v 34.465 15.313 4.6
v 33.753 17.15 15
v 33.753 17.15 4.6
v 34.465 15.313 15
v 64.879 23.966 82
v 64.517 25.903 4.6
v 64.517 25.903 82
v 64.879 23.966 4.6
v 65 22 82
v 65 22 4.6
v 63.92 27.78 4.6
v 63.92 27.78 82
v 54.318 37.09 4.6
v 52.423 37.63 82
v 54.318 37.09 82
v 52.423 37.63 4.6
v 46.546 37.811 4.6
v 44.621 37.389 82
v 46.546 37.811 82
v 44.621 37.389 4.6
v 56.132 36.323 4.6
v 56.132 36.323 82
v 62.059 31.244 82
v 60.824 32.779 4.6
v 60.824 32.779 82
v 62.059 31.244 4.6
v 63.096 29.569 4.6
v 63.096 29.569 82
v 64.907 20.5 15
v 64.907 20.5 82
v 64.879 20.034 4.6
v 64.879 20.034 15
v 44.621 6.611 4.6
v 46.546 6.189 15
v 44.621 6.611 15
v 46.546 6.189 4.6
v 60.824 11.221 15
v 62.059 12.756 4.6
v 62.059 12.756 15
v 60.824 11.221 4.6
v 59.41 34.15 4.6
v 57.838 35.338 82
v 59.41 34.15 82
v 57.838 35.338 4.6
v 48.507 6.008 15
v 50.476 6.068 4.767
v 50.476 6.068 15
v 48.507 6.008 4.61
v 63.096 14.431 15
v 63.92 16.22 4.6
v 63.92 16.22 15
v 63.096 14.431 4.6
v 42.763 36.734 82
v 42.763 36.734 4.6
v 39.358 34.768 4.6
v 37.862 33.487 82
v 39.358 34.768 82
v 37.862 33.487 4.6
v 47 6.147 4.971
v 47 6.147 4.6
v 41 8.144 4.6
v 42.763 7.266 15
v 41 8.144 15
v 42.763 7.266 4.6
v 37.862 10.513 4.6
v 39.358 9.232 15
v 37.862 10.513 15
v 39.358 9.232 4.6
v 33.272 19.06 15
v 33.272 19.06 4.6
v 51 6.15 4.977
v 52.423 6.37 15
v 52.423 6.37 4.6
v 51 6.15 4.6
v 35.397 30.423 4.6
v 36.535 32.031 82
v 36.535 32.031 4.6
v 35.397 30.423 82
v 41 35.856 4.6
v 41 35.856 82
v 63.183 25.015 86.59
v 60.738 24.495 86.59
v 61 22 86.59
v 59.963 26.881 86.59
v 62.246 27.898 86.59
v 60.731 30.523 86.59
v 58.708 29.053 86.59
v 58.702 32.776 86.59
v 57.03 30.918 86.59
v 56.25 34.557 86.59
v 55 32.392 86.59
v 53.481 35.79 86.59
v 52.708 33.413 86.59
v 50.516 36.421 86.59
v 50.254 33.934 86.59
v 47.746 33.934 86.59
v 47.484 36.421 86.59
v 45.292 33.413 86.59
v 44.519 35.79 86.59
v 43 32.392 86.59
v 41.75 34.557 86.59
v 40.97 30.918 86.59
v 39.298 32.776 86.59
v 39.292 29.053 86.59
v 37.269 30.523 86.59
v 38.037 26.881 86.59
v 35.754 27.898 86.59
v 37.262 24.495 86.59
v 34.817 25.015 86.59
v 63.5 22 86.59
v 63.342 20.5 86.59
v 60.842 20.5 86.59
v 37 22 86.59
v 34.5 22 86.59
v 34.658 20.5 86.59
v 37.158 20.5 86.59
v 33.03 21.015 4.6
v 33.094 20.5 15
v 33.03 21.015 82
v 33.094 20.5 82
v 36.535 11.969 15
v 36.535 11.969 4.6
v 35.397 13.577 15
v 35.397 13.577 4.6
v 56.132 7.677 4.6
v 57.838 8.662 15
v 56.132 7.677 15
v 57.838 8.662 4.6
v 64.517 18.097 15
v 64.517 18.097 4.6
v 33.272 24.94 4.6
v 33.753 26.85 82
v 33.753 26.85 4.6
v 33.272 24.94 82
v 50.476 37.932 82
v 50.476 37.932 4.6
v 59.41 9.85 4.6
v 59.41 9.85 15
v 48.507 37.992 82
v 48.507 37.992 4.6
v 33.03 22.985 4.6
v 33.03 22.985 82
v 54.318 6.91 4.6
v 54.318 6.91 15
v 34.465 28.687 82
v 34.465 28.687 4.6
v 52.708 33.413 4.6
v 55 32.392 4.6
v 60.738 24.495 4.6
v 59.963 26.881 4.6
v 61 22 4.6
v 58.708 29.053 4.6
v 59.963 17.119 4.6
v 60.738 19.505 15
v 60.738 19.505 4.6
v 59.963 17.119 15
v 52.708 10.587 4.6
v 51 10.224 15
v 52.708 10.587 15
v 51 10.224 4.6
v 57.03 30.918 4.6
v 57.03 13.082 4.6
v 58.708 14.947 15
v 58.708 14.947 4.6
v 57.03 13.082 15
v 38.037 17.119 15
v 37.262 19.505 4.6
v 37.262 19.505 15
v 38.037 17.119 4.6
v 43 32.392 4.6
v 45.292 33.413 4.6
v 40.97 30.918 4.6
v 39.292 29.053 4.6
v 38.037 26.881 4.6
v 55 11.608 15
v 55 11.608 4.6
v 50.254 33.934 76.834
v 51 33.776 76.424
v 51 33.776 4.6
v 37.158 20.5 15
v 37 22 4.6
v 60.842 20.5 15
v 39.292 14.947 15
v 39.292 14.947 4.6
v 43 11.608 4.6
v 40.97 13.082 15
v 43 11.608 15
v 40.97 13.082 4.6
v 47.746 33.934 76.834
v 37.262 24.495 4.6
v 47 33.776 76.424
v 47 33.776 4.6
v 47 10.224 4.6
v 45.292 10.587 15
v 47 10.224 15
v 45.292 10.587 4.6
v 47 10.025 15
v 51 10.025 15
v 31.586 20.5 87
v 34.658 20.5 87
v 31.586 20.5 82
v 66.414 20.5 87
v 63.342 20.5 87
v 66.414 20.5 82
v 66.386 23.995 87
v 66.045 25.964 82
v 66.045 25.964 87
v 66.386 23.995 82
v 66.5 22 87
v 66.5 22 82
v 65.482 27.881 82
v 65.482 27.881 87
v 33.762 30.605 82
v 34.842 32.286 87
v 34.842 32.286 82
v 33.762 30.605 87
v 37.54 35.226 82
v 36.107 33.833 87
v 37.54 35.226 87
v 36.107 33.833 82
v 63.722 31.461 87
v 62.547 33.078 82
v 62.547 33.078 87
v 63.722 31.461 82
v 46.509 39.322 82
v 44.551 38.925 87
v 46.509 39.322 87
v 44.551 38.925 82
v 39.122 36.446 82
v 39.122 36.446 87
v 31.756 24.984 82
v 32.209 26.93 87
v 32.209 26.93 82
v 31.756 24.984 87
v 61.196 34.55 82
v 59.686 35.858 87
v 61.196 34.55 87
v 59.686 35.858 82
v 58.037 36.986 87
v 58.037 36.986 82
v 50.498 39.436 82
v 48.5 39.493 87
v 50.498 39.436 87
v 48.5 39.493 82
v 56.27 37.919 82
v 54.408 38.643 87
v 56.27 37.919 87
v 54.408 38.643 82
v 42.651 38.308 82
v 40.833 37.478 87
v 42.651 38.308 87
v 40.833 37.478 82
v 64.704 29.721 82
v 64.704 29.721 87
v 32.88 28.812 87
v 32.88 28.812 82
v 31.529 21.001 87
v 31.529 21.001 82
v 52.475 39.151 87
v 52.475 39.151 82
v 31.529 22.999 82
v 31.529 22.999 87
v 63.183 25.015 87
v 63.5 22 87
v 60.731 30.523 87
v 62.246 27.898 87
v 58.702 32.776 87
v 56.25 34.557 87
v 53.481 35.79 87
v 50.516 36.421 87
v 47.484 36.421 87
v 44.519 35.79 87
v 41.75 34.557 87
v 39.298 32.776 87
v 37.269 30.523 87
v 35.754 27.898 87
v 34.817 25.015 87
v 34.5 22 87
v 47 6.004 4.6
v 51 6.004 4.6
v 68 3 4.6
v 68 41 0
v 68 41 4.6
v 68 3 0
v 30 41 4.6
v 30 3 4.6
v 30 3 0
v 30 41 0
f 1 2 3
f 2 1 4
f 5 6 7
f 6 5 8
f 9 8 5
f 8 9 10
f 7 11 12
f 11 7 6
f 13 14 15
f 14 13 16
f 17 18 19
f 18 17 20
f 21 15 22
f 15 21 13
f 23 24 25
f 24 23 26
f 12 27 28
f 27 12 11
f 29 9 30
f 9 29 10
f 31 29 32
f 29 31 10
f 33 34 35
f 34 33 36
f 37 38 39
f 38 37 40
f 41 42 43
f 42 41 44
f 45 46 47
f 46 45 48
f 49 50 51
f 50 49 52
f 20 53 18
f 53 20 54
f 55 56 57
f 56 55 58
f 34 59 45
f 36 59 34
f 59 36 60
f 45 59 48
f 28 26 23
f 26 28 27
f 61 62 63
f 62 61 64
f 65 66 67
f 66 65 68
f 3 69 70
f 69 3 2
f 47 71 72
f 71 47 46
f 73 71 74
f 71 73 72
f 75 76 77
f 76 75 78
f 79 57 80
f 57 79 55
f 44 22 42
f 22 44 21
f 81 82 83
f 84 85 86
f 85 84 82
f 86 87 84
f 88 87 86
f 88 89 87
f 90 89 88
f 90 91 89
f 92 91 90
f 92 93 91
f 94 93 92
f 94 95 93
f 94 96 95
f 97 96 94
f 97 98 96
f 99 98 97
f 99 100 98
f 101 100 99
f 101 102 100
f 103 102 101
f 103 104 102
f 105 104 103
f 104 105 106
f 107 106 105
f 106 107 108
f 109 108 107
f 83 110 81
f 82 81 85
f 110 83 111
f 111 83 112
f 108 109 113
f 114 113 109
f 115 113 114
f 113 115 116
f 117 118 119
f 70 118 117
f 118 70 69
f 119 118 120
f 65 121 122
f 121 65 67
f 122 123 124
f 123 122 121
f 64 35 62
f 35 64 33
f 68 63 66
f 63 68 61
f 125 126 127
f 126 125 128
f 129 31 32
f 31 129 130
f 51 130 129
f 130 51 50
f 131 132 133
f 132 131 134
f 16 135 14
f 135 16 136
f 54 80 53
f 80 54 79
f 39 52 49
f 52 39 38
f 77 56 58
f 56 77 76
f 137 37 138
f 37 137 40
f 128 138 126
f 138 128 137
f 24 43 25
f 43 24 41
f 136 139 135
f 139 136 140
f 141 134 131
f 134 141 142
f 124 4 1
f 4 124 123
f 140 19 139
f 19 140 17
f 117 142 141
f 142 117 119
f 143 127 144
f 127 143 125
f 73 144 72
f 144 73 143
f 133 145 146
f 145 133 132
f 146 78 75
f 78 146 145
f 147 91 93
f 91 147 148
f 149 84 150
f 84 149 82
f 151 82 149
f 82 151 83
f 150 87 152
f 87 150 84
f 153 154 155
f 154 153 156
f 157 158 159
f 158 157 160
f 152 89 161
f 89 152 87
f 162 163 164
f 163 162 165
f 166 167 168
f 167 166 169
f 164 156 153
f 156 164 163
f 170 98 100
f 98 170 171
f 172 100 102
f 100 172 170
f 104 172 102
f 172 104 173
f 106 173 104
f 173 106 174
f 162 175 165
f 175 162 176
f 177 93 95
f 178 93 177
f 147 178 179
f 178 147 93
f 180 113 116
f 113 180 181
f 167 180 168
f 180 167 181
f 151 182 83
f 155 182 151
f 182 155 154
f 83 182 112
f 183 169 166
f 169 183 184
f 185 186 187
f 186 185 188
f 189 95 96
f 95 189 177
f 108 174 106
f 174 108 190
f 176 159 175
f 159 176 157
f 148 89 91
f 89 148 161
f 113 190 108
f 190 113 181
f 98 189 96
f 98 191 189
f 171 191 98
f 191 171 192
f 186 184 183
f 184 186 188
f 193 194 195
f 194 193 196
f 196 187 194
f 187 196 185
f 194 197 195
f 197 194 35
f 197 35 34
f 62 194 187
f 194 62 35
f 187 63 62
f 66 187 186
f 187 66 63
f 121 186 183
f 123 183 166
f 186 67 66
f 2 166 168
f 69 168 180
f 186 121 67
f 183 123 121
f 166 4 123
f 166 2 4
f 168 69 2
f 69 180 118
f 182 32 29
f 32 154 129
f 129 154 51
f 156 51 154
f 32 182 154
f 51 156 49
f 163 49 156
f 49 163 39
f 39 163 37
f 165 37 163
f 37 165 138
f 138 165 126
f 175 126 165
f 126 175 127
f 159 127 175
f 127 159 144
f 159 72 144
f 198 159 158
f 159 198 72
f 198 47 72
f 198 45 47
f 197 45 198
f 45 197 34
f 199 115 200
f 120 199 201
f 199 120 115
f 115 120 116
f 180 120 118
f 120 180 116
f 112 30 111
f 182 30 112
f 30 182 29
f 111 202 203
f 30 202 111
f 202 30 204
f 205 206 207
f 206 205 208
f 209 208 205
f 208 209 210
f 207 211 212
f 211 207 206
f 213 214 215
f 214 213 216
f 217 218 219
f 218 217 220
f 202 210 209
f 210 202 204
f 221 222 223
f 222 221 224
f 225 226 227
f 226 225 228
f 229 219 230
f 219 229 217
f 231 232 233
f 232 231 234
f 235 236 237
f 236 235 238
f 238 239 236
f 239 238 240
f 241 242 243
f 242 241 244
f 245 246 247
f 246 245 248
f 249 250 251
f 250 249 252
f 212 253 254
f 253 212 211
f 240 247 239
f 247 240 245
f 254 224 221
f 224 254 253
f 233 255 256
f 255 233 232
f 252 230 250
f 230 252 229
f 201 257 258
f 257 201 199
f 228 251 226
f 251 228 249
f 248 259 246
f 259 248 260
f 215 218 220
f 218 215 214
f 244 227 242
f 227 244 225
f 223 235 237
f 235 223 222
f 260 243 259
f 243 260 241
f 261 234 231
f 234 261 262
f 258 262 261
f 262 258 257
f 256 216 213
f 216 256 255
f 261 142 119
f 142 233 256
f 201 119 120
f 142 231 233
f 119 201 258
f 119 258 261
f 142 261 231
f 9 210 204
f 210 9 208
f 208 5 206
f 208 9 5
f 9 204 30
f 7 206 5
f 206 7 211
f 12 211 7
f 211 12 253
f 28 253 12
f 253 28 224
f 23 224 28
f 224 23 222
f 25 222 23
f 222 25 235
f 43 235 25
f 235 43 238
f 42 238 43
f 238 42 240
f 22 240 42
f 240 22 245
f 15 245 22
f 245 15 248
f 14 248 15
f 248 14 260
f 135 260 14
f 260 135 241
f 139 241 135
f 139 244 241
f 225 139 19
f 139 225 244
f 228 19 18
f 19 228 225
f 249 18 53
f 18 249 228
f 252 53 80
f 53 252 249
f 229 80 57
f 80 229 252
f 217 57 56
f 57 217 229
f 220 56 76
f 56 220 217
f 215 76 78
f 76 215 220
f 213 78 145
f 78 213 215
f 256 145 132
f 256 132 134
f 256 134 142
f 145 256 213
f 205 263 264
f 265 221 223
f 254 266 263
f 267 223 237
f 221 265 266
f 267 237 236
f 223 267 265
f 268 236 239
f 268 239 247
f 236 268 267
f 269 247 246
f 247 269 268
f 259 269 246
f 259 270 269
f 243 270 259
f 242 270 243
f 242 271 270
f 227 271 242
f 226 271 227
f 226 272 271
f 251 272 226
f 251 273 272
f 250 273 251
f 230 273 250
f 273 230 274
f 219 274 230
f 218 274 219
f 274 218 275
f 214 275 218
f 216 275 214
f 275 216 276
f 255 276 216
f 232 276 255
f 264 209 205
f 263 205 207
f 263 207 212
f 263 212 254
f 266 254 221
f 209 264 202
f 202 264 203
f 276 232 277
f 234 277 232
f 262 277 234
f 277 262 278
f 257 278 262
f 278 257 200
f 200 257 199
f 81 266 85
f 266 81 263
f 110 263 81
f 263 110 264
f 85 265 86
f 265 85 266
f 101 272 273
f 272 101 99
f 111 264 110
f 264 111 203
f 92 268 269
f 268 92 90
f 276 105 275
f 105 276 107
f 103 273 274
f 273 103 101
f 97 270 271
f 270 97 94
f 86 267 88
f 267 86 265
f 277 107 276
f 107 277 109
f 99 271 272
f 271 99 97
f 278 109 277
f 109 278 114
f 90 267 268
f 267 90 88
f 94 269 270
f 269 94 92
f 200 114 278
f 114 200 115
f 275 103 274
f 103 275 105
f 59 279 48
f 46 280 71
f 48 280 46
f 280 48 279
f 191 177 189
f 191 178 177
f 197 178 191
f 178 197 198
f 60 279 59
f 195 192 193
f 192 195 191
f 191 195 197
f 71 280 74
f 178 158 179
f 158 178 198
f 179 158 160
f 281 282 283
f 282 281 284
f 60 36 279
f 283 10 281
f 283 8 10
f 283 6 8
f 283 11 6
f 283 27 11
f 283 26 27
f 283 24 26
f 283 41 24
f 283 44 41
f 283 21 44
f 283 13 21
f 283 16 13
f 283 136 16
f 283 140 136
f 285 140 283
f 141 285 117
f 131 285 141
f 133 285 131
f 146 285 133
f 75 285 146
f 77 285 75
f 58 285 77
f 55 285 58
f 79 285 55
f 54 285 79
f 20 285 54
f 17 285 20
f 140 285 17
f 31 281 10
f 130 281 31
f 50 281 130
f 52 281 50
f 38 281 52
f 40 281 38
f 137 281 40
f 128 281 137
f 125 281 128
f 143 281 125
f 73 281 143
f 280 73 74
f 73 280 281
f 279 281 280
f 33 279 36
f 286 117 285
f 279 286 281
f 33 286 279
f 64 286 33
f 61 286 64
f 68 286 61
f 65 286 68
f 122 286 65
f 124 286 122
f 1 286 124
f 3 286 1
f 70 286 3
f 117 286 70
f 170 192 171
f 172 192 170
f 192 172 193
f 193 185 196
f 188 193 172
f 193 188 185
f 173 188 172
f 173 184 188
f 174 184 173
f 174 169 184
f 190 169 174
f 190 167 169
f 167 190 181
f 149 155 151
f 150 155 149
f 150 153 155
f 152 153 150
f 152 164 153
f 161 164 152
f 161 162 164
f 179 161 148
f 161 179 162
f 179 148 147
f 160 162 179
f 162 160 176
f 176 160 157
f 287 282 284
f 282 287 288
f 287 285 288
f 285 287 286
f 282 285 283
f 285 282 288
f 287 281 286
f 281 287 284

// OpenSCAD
/* Uses OpenSCAD 2012.04.04

Parametric Replicator Spool Holder
==================================

This program renders 2 parts which allow for the mounting of non-standard spools on the Makerbot Replicator.

Part 1 is a left hand side wall support panel which clips into either of the holes at the back of the replicator which are
designed to be used by the Makerbot provided spool holders.  The panel design allows for larger spools to be offset from 
the standard spool holder by moving Part 2 along the slot.

Part 2 is a mounting tube and base which slides into the wall support panel and allows for the mounting of
the spool.

Both Part 1 and 2 can be customised for spools by changing the value of variables below.

The main variables which need to be customised are:

	SpoolHoleDiameter
	SpoolDepth

The "Layout" variable can be set to "Both", "Wall" or "Spool" to render the parts required for printing.

The Part 1 wall support panel can be Mirrored in ReplicatorG or Makerware to print for the right hand side spool.

*/

/* [Global] */

include <ScrewTab.scad>

// What to you want to print?
part = "Spool";										//  [Both:Both, Wall:Wall, Spool:Spool]

//--  Spool Dimensions     <<<<<<<=======   CHANGE THESE TO SUIT YOUR SPOOL.

// SpoolHoleDiameter = 52.0;								// Settings for standard Makerbot Spools.
// SpoolDepth = 80.0;
// SpoolHoleDiameter = 28.25;								// Settings for my PLA Spools.
// SpoolDepth = 76.0;


// Diameter of Hole in Centre of Spool (52.0 for Makerbot)?
SpoolHoleDiameter = 32.0;								// Settings for Makerbot Spools.

// Width of Spool (80.0 for Makerbot)?
SpoolDepth = 75.0;

/////////////////////////////////////////////////////////////////////////////////////////////////////////////////

print_part();

module print_part() {
	if (part == "Both") {
		WallSupport();
		SpoolSupport();
	} else if (part == "Wall") {
		WallSupport();
	} else {
		SpoolSupport();
	}
}

/*
=========== Rounded Top Box based on thing:6400
=========== Thanks to IHeartRobotics
*/

module RoundTopBox(pad, box_l, box_w, box_h, round_r, smooth)
{

//  NOTE: This box has a flat bottom unlike thing:6400
//  ====

//  pad 	     	// Padding to maintain manifold
//  box_l			// Length
//  box_w 		// Width
//  box_h			// Height
//  round_		// Radius of round
//  smooth		// Number of facets of rounding cylinder

// To fix the corners cut the main cube with smaller cubes with spheres removed.

  difference() {
	cube([box_l, box_w, box_h], center = true);

	translate([0, -box_w/2+round_r, box_h/2-round_r]) {
		difference() {
			translate([0,-round_r-pad,round_r+pad])
				cube([box_l+2*pad, round_r*2+pad, round_r*2+pad], center = true);
			rotate(a=[0,90,0])
				cylinder(box_l+4*pad,round_r,round_r,center=true,$fn=smooth);
		}
	}
	translate([0, box_w/2-round_r, box_h/2-round_r]) {
		difference() {
			translate([0,round_r+pad,round_r+pad])
				cube([box_l+2*pad, round_r*2+pad, round_r*2+pad], center = true);
			rotate(a=[0,90,0])
				cylinder(box_l+4*pad,round_r,round_r,center=true,$fn=smooth);
		}
	}

// ----

	translate([-box_l/2+round_r, box_w/2-round_r, 0]) {
		difference() {
			translate([-round_r-pad,round_r+pad,0])
				cube([round_r*2+pad, round_r*2+pad, box_h+2*pad], center = true);
			cylinder(box_h+4*pad,round_r,round_r,center=true,$fn=smooth);
		}
	}
	translate([box_l/2-round_r, box_w/2-round_r, 0]) {
		difference() {
			translate([round_r+pad,round_r+pad,0])
				cube([round_r*2+pad, round_r*2+pad, box_h+2*pad], center = true);
			cylinder(box_h+4*pad,round_r,round_r,center=true,$fn=smooth);
		}
	}

	translate([-box_l/2+round_r, -box_w/2+round_r, 0]) {
		difference() {
			translate([-round_r-pad,-round_r-pad,0])
				cube([round_r*2+pad, round_r*2+pad, box_h+2*pad], center = true);
			cylinder(box_h+4*pad,round_r,round_r,center=true,$fn=smooth);
		}
	}
	translate([box_l/2-round_r, -box_w/2+round_r, 0]) {
		difference() {
			translate([round_r+pad,-round_r-pad,0])
				cube([round_r*2+pad, round_r*2+pad, box_h+2*pad], center = true);
			cylinder(box_h+4*pad,round_r,round_r,center=true,$fn=smooth);
		}
	}

// ----

	translate([-box_l/2+round_r, 0, box_h/2-round_r]) {
		difference() {
			translate([-round_r-pad, 0, round_r+pad])
				cube([round_r*2+pad, box_w+2*pad, round_r*2+pad], center = true);
			rotate(a=[0,90,90])
				cylinder(box_w+4*pad,round_r,round_r,center=true,$fn=smooth);
		}
	}
	translate([box_l/2-round_r, 0, box_h/2-round_r]) {
		difference() {
			translate([round_r+pad, 0, round_r+pad])
				cube([round_r*2+pad, box_w+2*pad, round_r*2+pad], center = true);
			rotate(a=[0,90,90])
				cylinder(box_w+4*pad,round_r,round_r,center=true,$fn=smooth);
		}
	}

// ----

	translate([box_l/2-round_r, box_w/2-round_r, box_h/2-round_r]) {
		difference() {
			translate([round_r+pad, round_r+pad, round_r+pad])
				cube([round_r*2+pad, round_r*2+pad, round_r*2+pad], center = true);
			sphere(round_r,center=true,$fn=smooth);
		}
	}
	translate([-box_l/2+round_r, box_w/2-round_r, box_h/2-round_r]) {
		difference() {
			translate([-round_r-pad, round_r+pad, round_r+pad])
				cube([round_r*2+pad, round_r*2+pad, round_r*2+pad], center = true);
			sphere(round_r,center=true,$fn=smooth);
		}
	}
	translate([box_l/2-round_r, -box_w/2+round_r, box_h/2-round_r]) {
		difference() {
			translate([round_r+pad, -round_r-pad, round_r+pad])
				cube([round_r*2+pad, round_r*2+pad, round_r*2+pad], center = true);
			sphere(round_r,center=true,$fn=smooth);
		}
	}
	translate([-box_l/2+round_r, -box_w/2+round_r, box_h/2-round_r]) {
		difference() {
			translate([-round_r-pad, -round_r-pad, round_r+pad])
				cube([round_r*2+pad, round_r*2+pad, round_r*2+pad], center = true);
			sphere(round_r,center=true,$fn=smooth);
		}
	}
}

}


/*
===========  OpenSCAD Shapes Library (www.openscad.at)
===========  Copyright (C) 2009  Catarina Mota <clifford@clifford.at>
*/


module tube(height, radius, wall) {
	difference(){
		cylinder(height, radius, radius,$fa=1);
		cylinder(height, radius-wall, radius-wall);
	}
}

module box(w,h,d) {
	scale ([w,h,d]) cube(1, true);
}

//-----------------------
//MOVES THE ROTATION AXIS OF A BOX FROM ITS CENTER TO THE BOTTOM LEFT CORNER
module dislocateBox(w,h,d){
	translate([w/2,h,0]){
		difference(){
			box(w, h*2, d+1);
			translate([-w,0,0]) box(w, h*2, d+1);
		}
	}
}


module rightTriangle(adjacent, opposite, depth) {
	difference(){
		translate([-adjacent/2,opposite/2,0]) box(adjacent, opposite, depth);
		translate([-adjacent,0,0]){
			rotate([0,0,atan(opposite/adjacent)]) dislocateBox(adjacent*2, opposite, depth);
		}
	}
}
/*
  ==============================================================================
   MAIN CODE
  ==============================================================================
*/


//--  Variables for Hole in Wall.

HoleInWallWidth = 32.0 * 1;									// Size of the hole in the Replicator Wall.
HoleInWallHeight = 17.0 * 1;
HoleInWallDepth = 5.0 * 1;
LedgeHeight = 10.0 * 1;										// Height of inside support ledge.
InsideSupportThickness = 3.0 * 1;								// Thickness of Cube to hold inside Replicator.

//--  Standard Build Variables.

OutsideBaseWidth = 80.0 * 1;									// Size of external support baseplate
OutsideBaseDepth = 4.0 * 1;
SideTrackWidth = 3.0 * 1;
SideTrackHeight = 5.0 * 1;
SideTopHeight = 6.0 * 1;
InnerTrackWidth = 3.0 * 1;
TubeThickness = 4.0 * 1;
TubeCollarWidth = 5.0 * 1;
TubeCollarHeight = 3.0 * 1;
TubeBaseClearance = 3.0 * 1;									// Space between edge of baseplate and tube.
TubeBaseSlippage = 0.5 * 1;									// Slippage between tube base plate and side rail.


//--  Calculated Dimensions

OutsideBaseHeight = SpoolHoleDiameter + (TubeBaseClearance * 2) + (SideTrackWidth * 2) + (TubeBaseSlippage * 2);

SideTrackStart = InsideSupportThickness + HoleInWallDepth + OutsideBaseDepth;
SideTopStart = SideTrackStart + SideTrackHeight;
SideTopWidth = SideTrackWidth + InnerTrackWidth;
UpperTrackStart = OutsideBaseHeight - SideTrackWidth;
UpperTopStart = OutsideBaseHeight - SideTopWidth;

SpoolPrintOffset = 30 * 1;									// Offset of Spool from Wall Support for print layout

SpoolBaseplateDepth = SideTrackHeight - 0.4;
SpoolBaseplateXorY = SpoolHoleDiameter + (TubeBaseClearance * 2);

//-- Wall Support Panel.

module WallSupport() {


//-- Screw Mounts

  color("CadetBlue") 
    translate([(InsideSupportThickness + HoleInWallDepth),0,8])
        rotate([270,0,270])
            screw_tab(8,OutsideBaseDepth,4.1,OutsideBaseWidth);

  color("CadetBlue") 
    translate([(InsideSupportThickness + HoleInWallDepth),0,OutsideBaseWidth-8])
        rotate([270,0,270])
            screw_tab(8,OutsideBaseDepth,4.1,OutsideBaseWidth);
    
  color("RoyalBlue") translate([(InsideSupportThickness + HoleInWallDepth),-8,16])
		 cube([OutsideBaseDepth,8,OutsideBaseWidth-32]);

  color("CadetBlue") 
    translate([(InsideSupportThickness + HoleInWallDepth),OutsideBaseHeight,8])
        rotate([270,180,270])
            screw_tab(8,OutsideBaseDepth,4.1,OutsideBaseWidth);

  color("CadetBlue") 
    translate([(InsideSupportThickness + HoleInWallDepth),OutsideBaseHeight,OutsideBaseWidth-8])
        rotate([270,180,270])
            screw_tab(8,OutsideBaseDepth,4.1,OutsideBaseWidth);

  color("RoyalBlue") translate([(InsideSupportThickness + HoleInWallDepth),OutsideBaseHeight,16])
		 cube([OutsideBaseDepth,8,OutsideBaseWidth-32]);

//-- Outside Base.

  color("RoyalBlue") translate([(InsideSupportThickness + HoleInWallDepth),0,0])
		 cube([OutsideBaseDepth,OutsideBaseHeight,OutsideBaseWidth]);

//-- Bottom Side.

  color("Gray") translate([SideTrackStart,0,0])
		 cube([SideTrackHeight,SideTrackWidth,OutsideBaseWidth]);

//-- Top Side.

  color("Beige") translate([SideTrackStart,UpperTrackStart,0])
		 cube([SideTopHeight,SideTrackWidth,OutsideBaseWidth]);

//-- Lower Top Guide.

  color("LawnGreen") translate([SideTopStart + (SideTopHeight/2.0),SideTopWidth/2.0,OutsideBaseWidth/2.0]) rotate([90,90,90])
		 RoundTopBox( 0.1, OutsideBaseWidth, SideTopHeight, SideTopWidth,  1.5, 20);

//-- Upper Top Guide.

  color("LimeGreen") translate([SideTopStart+ (SideTopHeight/2.0),UpperTopStart + SideTopWidth/2.0,OutsideBaseWidth/2.0])
		 rotate([90,90,90])
		 RoundTopBox( 0.1, OutsideBaseWidth, SideTopHeight, SideTopWidth,  1.5, 20.0);

}

module BasePlate() {

	color("red") translate([SpoolPrintOffset, SideTrackWidth, 0])
	cube([SpoolBaseplateXorY,SpoolBaseplateXorY,SpoolBaseplateDepth]);
  
}

module MainTube() {
	
 	difference(){ 
	
    	color("Yellow") 
		translate([SpoolPrintOffset + (SpoolBaseplateXorY /2.0),SideTrackWidth + (SpoolBaseplateXorY / 2.0),SpoolBaseplateDepth-0.01])
		tube(SpoolDepth + SideTopHeight + 1.0,SpoolHoleDiameter/2.0,TubeThickness);
		
		color("Orange") 
		//  Leave 15mm lower collar to strengthen printing.
    	translate([SpoolPrintOffset,0,15])
		cube([SpoolBaseplateXorY,(SpoolBaseplateXorY  + TubeBaseClearance)/2,SpoolDepth  + SideTopHeight + 1.0 + TubeCollarWidth ]);
  }
}

module UpperCollar() {

	difference(){ 
    	color("SkyBlue")
 		translate([SpoolPrintOffset + (SpoolBaseplateXorY /2.0),SideTrackWidth + (SpoolBaseplateXorY / 2.0),SpoolDepth  + SideTopHeight + 1.0])
		tube(TubeCollarWidth,(SpoolHoleDiameter + TubeCollarHeight)/2.0,TubeCollarHeight);
		
    	translate([SpoolPrintOffset,0,0])
		cube([SpoolBaseplateXorY,(SpoolBaseplateXorY  + TubeBaseClearance)/2,SpoolDepth + SideTopHeight + 1.0 +TubeCollarWidth]);
  }
}

module SupportTriangle() {

	color("pink")
	translate([SpoolPrintOffset + (SpoolHoleDiameter /2.0)
			+ TubeBaseClearance,SpoolBaseplateXorY - TubeBaseClearance,SpoolBaseplateDepth-0.01]) rotate ([0,90,180])
	rightTriangle(SpoolDepth,SpoolHoleDiameter - TubeBaseClearance,TubeThickness);

}

//--	Spool Tube and support base.

module SpoolSupport() {

	BasePlate();
	MainTube();
	UpperCollar();
	SupportTriangle();
}
